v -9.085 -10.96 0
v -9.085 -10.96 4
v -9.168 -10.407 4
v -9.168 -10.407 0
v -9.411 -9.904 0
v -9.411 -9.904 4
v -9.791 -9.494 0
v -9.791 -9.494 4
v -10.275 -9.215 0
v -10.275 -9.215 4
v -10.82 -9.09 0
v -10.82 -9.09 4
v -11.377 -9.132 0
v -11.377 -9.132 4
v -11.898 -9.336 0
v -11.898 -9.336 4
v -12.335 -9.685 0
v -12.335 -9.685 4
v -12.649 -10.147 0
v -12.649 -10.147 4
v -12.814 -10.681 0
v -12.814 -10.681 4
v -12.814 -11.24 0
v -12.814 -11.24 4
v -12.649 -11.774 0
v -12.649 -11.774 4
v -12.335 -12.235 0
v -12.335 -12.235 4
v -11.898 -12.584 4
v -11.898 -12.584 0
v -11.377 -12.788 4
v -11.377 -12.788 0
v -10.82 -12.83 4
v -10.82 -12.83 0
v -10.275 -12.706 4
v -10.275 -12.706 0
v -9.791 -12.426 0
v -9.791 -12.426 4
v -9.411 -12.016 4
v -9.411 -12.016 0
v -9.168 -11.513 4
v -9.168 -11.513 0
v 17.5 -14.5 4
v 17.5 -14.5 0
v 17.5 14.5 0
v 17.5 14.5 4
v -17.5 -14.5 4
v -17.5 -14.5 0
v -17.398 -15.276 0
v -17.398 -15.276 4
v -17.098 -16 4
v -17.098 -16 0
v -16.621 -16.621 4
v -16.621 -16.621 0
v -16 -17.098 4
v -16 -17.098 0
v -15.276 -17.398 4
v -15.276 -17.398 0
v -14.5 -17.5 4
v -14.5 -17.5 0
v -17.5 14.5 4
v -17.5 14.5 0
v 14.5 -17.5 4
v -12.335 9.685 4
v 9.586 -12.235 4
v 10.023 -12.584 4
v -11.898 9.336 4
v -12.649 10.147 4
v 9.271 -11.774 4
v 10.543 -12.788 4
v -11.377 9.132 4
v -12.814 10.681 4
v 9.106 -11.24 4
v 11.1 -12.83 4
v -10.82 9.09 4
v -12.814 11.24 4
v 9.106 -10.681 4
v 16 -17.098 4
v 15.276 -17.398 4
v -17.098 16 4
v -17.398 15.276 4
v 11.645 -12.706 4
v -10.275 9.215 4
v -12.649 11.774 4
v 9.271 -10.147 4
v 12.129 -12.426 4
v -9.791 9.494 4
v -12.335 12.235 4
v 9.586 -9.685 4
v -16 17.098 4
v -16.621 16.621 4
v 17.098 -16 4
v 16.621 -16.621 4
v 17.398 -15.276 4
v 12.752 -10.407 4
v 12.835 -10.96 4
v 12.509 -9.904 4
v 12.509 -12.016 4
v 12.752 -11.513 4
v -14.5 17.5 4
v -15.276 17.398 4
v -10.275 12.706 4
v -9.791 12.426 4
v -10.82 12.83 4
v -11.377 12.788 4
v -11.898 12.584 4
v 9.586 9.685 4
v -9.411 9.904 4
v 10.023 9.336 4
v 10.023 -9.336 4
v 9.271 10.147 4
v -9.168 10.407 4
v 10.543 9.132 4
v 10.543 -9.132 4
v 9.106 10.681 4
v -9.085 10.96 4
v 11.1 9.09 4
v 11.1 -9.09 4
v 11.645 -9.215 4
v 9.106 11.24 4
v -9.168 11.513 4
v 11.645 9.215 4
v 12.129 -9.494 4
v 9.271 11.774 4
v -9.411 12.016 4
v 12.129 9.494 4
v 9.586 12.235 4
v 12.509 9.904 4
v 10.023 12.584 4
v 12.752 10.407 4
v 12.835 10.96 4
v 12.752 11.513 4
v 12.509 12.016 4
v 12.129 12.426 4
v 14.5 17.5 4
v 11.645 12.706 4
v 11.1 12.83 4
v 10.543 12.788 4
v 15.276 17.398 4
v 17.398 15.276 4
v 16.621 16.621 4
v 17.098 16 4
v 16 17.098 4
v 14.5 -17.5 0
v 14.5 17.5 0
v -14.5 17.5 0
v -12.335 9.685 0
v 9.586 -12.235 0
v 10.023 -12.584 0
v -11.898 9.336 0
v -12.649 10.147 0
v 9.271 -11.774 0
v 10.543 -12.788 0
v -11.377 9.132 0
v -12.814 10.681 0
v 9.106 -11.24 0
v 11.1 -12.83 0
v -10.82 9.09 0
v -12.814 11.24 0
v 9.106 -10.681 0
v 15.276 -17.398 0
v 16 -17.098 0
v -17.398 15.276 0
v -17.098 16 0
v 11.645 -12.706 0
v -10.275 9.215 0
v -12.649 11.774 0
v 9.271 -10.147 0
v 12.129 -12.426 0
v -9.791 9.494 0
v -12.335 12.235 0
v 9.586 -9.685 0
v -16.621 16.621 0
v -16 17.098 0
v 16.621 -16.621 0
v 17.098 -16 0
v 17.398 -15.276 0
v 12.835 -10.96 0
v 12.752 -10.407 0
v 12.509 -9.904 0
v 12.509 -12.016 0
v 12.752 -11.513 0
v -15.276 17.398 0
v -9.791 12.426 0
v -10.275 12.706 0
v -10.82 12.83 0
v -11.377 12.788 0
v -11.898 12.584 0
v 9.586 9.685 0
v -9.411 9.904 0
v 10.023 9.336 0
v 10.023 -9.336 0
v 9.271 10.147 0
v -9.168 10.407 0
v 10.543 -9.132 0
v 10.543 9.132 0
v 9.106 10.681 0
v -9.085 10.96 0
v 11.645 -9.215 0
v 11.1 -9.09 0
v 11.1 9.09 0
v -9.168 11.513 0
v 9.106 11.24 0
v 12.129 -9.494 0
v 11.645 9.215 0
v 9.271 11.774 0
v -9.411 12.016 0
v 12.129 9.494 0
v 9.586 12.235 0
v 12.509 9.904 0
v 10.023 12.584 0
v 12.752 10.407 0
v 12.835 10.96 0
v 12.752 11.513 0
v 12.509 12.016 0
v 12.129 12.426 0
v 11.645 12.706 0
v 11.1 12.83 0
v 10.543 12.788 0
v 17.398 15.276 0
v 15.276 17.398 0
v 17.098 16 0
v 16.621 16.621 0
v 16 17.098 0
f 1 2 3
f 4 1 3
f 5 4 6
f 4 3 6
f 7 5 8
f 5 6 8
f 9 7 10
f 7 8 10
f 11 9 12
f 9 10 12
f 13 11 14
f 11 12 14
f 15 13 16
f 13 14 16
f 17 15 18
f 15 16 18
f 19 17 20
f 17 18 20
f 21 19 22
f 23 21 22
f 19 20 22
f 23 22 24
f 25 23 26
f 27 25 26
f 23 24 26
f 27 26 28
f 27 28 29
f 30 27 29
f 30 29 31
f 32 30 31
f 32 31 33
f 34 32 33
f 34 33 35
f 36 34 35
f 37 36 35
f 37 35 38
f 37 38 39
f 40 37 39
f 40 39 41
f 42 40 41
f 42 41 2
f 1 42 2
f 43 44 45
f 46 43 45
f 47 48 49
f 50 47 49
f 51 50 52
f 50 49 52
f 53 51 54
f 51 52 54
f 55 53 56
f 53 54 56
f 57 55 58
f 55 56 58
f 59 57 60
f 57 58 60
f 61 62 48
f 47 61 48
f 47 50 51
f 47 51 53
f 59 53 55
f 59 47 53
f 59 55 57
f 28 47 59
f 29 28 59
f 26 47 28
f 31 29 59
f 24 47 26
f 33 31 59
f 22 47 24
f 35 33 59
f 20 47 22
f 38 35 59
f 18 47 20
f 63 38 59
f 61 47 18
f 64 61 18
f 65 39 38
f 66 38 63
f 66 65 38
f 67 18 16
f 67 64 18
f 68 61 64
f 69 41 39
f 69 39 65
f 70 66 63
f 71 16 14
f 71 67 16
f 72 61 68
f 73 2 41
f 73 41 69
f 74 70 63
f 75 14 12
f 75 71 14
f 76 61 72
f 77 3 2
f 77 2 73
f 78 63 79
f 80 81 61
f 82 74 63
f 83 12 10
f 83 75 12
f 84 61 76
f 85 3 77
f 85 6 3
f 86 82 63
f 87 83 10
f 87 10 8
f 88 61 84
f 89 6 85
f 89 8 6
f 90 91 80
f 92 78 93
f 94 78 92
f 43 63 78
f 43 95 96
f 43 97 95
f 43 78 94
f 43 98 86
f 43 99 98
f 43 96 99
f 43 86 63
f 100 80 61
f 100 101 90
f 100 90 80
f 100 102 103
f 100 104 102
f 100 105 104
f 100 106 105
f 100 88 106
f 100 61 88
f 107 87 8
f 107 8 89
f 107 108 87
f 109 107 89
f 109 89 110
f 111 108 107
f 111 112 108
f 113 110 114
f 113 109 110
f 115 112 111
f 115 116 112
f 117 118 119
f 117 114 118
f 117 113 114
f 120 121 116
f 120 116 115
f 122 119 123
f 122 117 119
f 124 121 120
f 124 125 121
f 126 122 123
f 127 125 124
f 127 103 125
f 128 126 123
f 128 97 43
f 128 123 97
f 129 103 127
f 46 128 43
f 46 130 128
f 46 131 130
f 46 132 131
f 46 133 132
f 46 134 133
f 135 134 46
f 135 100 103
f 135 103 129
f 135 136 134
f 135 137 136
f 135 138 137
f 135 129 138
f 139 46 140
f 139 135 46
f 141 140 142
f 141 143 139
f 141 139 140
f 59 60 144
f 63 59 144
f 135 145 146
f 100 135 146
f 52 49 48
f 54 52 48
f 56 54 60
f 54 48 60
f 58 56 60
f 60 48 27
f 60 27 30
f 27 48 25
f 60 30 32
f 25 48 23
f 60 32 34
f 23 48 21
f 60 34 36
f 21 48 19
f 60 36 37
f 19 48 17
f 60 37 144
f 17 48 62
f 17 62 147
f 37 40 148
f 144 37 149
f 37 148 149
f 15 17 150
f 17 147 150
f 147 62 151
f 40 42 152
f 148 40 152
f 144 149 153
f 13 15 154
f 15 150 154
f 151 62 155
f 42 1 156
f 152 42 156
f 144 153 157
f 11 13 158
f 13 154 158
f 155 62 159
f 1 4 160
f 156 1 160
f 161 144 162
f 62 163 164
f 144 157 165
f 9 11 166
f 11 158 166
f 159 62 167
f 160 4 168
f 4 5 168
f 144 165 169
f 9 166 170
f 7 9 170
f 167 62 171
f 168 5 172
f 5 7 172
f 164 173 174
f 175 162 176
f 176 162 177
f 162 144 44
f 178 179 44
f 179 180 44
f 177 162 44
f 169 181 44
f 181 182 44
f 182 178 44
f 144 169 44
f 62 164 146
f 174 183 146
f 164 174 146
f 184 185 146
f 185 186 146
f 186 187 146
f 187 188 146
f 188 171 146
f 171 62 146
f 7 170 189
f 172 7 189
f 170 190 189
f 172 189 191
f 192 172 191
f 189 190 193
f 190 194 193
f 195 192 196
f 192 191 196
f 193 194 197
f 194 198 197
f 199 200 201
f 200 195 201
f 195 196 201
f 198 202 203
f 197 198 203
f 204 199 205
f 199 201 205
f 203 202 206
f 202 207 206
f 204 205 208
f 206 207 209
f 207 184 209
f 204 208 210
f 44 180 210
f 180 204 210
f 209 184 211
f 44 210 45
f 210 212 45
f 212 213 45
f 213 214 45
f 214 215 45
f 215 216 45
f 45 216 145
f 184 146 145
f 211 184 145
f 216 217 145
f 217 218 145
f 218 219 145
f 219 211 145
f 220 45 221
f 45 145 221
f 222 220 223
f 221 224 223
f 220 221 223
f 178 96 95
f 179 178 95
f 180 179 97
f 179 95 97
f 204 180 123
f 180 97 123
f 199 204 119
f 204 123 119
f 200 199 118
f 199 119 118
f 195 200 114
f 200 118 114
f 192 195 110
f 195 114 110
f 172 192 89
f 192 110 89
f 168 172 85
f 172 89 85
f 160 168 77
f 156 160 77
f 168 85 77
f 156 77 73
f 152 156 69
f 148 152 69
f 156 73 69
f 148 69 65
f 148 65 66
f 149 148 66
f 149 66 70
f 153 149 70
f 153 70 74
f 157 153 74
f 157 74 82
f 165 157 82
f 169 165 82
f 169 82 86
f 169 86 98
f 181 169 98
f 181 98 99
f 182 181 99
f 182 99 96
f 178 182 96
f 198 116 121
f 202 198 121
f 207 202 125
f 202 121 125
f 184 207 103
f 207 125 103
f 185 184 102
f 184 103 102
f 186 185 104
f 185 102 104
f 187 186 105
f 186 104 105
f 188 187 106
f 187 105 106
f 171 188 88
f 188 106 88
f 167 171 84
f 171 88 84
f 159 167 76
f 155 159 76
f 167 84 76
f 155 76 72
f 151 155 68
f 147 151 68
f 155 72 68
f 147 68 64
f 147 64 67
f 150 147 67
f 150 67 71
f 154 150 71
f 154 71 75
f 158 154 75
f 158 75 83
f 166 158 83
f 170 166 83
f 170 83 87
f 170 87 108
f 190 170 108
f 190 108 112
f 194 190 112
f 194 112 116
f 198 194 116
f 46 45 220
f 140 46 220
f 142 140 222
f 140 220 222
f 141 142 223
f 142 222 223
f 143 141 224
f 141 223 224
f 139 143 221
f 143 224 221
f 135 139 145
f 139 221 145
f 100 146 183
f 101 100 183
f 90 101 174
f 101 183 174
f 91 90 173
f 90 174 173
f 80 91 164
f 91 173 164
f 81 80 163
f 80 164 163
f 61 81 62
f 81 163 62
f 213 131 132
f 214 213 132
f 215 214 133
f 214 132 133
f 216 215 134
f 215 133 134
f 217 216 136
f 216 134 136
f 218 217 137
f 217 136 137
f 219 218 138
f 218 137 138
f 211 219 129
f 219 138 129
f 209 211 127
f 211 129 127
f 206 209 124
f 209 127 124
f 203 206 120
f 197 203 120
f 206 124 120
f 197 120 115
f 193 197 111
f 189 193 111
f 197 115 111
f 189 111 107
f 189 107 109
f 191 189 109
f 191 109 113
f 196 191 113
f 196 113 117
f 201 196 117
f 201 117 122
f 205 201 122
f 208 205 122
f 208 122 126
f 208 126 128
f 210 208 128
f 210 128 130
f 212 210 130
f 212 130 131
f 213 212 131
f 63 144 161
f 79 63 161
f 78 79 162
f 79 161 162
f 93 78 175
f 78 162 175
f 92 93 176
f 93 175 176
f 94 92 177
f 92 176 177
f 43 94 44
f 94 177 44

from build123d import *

# Parameters (mm, degrees)
SM_BASE_FLANGE_1_DEPTH = 4
M4X0_251_D             = 3.75
M4X0_251_DEPTH         = 9.25
M4X0_251_TIP           = 1.126613661


# Sheet-metal steps are written as plain solids
with BuildPart() as part:
    # Sketch 1 → Базовая кромка1 (new body)
    with BuildSketch(Plane.XY):
        with BuildLine():
            Line((-14.5, -17.5), (14.5, -17.5))
            ThreePointArc((14.5, -17.5), (16.621320344, -16.621320344), (17.5, -14.5))
            Line((17.5, -14.5), (17.5, 14.5))
            ThreePointArc((17.5, 14.5), (16.621320344, 16.621320344), (14.5, 17.5))
            Line((14.5, 17.5), (-14.5, 17.5))
            ThreePointArc((-14.5, 17.5), (-16.621320344, 16.621320344), (-17.5, 14.5))
            Line((-17.5, 14.5), (-17.5, -14.5))
            ThreePointArc((-17.5, -14.5), (-16.621320344, -16.621320344), (-14.5, -17.5))
        make_face()
    extrude(amount=SM_BASE_FLANGE_1_DEPTH)

    # Отверстие обработанное метчиком M4x0.251
    with Locations(Plane(origin=(0, 0, 0), x_dir=(-1, 0, 0), z_dir=(0, 0, -1))):
        with Locations((-10.960155108, 10.960155108), (10.960155108, 10.960155108), (10.960155108, -10.960155108), (-10.960155108, -10.960155108)):
            Hole(M4X0_251_D / 2, depth=M4X0_251_DEPTH)
            with Locations((0, 0, -(M4X0_251_DEPTH + M4X0_251_TIP / 2))):  # 118° drill point
                Cone(0, M4X0_251_D / 2, M4X0_251_TIP, mode=Mode.SUBTRACT)


solid = part.part
